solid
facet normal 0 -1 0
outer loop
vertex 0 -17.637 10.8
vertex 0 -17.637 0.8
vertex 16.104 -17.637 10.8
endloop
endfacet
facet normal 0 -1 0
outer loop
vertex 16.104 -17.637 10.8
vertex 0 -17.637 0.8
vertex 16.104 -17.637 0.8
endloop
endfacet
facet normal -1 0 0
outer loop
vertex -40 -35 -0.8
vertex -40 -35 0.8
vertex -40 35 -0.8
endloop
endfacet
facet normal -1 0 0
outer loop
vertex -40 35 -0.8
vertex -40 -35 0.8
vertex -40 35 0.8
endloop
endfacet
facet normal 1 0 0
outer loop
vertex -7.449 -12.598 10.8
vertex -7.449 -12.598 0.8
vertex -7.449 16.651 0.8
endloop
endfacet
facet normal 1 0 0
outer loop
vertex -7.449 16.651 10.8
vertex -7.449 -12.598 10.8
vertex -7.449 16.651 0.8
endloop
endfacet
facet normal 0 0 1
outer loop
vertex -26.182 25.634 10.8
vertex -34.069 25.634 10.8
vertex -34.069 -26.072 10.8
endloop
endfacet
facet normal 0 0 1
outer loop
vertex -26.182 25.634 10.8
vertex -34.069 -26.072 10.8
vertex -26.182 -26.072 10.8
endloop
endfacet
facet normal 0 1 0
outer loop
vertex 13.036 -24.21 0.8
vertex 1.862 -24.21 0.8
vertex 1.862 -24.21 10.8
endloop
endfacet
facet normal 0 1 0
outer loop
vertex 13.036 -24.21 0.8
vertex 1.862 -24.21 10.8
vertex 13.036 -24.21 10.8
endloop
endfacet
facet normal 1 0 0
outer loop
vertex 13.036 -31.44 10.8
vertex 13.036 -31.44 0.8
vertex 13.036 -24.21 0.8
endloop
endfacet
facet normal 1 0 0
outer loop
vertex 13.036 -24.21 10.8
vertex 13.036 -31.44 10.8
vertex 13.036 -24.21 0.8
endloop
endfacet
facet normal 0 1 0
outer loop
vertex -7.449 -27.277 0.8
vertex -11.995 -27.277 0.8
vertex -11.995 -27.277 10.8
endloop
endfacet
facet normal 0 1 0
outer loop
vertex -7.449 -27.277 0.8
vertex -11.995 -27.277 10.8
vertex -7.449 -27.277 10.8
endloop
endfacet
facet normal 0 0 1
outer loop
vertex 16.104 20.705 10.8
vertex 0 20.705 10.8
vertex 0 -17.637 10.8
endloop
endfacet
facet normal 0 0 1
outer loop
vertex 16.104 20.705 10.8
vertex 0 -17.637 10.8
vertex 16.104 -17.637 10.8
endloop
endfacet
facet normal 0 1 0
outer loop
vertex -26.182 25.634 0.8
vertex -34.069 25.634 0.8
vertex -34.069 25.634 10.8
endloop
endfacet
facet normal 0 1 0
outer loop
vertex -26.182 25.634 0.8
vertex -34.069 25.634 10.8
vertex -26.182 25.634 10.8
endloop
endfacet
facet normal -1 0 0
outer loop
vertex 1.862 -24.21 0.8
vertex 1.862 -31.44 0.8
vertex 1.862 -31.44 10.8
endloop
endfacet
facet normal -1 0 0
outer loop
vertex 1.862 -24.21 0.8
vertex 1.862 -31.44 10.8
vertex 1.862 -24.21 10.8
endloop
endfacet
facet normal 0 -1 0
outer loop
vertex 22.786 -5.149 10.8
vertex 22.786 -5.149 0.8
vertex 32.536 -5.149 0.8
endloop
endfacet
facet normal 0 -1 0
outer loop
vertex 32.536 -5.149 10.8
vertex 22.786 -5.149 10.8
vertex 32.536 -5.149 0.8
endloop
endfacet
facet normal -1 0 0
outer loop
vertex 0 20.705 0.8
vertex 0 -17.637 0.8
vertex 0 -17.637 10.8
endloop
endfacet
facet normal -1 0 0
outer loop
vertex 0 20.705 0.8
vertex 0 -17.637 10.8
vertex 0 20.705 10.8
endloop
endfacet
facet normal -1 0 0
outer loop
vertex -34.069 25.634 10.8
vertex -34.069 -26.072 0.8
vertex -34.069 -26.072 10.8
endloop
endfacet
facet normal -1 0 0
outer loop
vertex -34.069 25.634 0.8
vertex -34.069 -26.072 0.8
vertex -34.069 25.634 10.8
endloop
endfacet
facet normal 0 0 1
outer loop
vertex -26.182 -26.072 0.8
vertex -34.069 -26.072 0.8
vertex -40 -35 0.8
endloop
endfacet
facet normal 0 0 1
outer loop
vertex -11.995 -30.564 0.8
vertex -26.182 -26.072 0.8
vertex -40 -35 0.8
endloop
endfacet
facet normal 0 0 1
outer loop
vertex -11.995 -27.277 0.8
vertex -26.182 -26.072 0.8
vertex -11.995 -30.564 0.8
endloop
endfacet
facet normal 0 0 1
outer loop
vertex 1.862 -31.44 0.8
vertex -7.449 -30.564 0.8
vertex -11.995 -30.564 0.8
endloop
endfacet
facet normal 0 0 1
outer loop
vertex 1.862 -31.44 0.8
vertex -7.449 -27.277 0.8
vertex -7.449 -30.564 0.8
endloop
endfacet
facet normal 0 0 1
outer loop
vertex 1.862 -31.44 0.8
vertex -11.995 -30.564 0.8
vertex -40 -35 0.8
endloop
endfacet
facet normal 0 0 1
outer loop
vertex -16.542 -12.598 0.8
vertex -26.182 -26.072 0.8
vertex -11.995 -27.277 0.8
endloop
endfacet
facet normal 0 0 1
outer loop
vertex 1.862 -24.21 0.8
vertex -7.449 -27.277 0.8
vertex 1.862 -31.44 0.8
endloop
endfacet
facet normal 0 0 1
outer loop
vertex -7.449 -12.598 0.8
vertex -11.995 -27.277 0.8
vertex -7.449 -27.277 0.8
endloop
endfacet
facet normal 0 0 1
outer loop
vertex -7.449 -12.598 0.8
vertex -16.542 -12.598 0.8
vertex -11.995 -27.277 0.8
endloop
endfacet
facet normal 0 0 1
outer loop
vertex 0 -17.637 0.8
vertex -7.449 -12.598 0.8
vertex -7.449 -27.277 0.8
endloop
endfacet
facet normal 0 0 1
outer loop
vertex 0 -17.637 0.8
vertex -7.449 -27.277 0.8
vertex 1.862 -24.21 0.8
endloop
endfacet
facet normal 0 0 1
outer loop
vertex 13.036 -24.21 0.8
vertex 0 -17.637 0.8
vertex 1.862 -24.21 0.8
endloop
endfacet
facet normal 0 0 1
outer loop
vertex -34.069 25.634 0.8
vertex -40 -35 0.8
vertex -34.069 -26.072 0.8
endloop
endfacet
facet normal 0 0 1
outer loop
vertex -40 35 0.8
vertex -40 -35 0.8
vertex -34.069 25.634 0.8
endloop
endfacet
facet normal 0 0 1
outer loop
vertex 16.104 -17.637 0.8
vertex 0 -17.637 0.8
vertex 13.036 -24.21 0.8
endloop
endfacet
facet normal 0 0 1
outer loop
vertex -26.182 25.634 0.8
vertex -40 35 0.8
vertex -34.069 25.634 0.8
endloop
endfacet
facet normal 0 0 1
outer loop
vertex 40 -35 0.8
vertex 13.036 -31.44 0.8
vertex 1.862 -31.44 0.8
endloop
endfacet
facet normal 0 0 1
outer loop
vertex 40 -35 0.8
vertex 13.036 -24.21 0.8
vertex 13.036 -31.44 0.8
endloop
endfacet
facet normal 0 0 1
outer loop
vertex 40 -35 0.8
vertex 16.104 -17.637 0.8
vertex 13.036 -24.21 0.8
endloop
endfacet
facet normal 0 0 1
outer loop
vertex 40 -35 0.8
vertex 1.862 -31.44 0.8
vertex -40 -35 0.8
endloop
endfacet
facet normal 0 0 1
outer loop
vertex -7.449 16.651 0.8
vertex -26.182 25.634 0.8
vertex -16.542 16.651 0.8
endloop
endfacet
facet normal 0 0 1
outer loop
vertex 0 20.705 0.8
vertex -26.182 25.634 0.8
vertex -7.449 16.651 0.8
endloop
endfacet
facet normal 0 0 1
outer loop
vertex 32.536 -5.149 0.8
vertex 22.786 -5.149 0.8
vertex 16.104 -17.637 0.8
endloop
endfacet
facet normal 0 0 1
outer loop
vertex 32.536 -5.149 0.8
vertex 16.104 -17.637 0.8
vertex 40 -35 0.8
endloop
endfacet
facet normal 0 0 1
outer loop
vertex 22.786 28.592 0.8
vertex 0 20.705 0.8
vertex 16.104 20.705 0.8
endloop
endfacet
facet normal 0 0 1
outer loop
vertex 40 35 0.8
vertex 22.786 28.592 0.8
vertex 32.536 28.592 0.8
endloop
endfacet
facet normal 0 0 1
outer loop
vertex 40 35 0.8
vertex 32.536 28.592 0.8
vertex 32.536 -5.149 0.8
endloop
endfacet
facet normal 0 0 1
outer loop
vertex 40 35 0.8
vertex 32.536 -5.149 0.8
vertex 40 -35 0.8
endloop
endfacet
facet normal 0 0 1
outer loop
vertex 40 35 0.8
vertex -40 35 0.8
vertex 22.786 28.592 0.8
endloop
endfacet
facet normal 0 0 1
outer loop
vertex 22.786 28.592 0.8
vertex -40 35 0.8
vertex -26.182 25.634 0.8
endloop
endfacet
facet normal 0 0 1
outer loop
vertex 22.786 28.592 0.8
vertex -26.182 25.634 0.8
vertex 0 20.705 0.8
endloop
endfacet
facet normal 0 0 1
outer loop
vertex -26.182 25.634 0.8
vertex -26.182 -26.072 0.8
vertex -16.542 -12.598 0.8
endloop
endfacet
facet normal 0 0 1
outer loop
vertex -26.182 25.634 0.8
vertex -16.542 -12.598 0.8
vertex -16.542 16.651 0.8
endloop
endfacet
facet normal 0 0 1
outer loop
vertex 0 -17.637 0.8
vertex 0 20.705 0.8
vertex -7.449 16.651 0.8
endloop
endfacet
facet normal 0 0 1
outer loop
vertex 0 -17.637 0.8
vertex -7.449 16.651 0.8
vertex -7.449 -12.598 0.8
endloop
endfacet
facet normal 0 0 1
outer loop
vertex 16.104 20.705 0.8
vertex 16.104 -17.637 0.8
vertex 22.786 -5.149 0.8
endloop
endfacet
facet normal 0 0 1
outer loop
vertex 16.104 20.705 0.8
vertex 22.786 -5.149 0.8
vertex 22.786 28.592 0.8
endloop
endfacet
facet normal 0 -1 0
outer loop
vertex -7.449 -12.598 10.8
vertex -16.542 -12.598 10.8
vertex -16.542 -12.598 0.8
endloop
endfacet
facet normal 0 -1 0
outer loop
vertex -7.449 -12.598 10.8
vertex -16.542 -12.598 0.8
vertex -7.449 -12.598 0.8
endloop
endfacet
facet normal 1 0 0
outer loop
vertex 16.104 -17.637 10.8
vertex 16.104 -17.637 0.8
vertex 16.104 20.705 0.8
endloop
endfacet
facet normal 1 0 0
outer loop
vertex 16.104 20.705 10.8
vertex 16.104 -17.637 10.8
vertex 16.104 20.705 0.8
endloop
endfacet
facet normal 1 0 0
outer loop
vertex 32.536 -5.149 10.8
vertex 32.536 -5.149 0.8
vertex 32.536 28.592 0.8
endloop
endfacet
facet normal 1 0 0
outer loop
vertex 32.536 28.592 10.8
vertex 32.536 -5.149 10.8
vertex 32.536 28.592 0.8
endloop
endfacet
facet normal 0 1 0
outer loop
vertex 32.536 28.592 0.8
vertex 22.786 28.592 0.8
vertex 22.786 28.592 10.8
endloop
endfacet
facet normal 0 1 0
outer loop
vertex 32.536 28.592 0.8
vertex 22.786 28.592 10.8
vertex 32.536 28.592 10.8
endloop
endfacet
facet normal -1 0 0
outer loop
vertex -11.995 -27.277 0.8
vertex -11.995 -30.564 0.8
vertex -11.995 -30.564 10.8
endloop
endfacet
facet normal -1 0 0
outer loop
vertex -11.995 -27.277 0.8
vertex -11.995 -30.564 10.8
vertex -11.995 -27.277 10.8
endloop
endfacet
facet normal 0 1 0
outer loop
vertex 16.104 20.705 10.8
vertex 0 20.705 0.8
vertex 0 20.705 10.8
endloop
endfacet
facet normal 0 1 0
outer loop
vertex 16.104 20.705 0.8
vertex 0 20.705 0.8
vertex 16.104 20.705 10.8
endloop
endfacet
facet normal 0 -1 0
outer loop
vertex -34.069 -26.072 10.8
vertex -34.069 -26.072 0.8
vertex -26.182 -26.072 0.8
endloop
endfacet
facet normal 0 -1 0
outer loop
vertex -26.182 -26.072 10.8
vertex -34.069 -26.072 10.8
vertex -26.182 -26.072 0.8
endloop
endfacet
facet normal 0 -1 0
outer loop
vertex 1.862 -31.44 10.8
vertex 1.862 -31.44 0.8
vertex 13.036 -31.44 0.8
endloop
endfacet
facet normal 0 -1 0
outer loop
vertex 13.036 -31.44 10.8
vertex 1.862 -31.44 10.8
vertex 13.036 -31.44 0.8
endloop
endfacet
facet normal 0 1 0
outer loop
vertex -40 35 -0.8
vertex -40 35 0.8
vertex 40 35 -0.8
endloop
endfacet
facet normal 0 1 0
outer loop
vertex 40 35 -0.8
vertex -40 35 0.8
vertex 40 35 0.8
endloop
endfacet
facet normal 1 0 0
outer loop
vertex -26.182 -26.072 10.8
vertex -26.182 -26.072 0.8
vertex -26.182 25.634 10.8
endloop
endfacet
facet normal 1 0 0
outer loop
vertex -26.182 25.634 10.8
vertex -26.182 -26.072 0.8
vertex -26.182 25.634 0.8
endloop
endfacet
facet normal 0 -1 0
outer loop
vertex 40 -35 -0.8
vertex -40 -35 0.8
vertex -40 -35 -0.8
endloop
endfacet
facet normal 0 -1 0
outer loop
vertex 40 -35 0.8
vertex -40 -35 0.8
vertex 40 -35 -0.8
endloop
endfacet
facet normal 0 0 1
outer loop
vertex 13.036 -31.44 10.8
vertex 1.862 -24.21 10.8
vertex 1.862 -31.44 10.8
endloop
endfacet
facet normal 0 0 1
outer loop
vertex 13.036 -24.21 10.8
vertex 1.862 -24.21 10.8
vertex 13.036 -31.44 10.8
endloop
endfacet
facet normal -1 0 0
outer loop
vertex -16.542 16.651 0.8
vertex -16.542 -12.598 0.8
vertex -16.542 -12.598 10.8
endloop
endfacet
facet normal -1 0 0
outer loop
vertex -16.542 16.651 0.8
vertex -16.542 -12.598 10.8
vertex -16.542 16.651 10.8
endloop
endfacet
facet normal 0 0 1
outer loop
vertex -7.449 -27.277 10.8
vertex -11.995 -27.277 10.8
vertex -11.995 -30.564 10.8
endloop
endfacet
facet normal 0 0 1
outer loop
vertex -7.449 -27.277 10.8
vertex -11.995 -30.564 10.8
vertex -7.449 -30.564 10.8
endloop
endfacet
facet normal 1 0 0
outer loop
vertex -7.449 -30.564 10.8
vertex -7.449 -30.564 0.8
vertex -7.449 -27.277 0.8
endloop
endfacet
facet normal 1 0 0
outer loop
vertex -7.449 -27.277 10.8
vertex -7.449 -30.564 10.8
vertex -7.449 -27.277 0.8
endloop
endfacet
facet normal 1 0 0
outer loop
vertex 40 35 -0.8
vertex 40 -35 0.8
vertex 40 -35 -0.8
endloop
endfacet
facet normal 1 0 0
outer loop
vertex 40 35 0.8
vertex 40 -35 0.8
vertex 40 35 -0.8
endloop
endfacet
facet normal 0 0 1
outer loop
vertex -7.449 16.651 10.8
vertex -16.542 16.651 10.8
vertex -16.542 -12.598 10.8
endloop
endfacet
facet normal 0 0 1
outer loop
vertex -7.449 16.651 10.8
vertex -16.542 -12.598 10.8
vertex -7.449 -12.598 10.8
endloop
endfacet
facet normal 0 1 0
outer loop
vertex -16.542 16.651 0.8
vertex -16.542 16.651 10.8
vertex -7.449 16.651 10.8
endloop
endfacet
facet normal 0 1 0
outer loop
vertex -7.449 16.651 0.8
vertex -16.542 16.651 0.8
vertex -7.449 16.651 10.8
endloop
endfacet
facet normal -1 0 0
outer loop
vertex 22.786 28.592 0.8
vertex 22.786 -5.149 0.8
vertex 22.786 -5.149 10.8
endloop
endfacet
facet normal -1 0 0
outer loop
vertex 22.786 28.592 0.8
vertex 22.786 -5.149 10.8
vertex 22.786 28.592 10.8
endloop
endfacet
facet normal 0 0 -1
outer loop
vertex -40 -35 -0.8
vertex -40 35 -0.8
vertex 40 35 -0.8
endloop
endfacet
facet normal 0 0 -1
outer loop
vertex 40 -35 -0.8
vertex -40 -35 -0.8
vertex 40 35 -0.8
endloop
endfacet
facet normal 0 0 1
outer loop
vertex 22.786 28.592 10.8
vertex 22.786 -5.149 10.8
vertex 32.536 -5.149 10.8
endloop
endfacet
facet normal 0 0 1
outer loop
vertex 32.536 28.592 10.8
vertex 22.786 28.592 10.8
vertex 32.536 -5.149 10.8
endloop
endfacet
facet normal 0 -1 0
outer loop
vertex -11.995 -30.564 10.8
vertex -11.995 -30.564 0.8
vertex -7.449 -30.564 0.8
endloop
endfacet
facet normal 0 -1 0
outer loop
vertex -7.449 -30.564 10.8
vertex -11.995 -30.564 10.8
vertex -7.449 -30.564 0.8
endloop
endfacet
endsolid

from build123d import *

# Parameters (mm, degrees)
SKETCH1_W           = 80
SKETCH1_H           = 70
BOSS_EXTRUDE1_DEPTH = 0.8
SKETCH2_W           = 9.092469125
SKETCH2_H           = 29.249268146
SKETCH2_W_2         = 16.103529653
SKETCH2_H_2         = 38.34173727
SKETCH2_W_3         = 7.887443096
SKETCH2_H_3         = 51.706571405
SKETCH2_W_4         = 9.749756049
SKETCH2_H_4         = 33.740728797
SKETCH2_W_5         = 4.546234562
SKETCH2_H_5         = 3.286434623
SKETCH2_W_6         = 11.173877719
SKETCH2_H_6         = 7.23015617
BOSS_EXTRUDE2_DEPTH = 10


with BuildPart() as part:
    # Sketch1 → Boss-Extrude1 (new, symmetric)
    with BuildSketch(Plane.XY):
        Rectangle(SKETCH1_W, SKETCH1_H)
    extrude(amount=BOSS_EXTRUDE1_DEPTH, both=True)

    # Sketch2 → Boss-Extrude2 (add)
    with BuildSketch(Plane.XY.offset(0.8)):
        with Locations((-11.995486375, 2.026634684)):
            Rectangle(SKETCH2_W, SKETCH2_H)
        with Locations((8.051764827, 1.533669491)):
            Rectangle(SKETCH2_W_2, SKETCH2_H_2)
        with Locations((-30.125650712, -0.219095641)):
            Rectangle(SKETCH2_W_3, SKETCH2_H_3)
        with Locations((27.660824745, 11.721616822)):
            Rectangle(SKETCH2_W_4, SKETCH2_H_4)
        with Locations((-9.722369093, -28.920624684)):
            Rectangle(SKETCH2_W_5, SKETCH2_H_5)
        with Locations((7.449251813, -27.825146476)):
            Rectangle(SKETCH2_W_6, SKETCH2_H_6)
    extrude(amount=BOSS_EXTRUDE2_DEPTH)


solid = part.part
